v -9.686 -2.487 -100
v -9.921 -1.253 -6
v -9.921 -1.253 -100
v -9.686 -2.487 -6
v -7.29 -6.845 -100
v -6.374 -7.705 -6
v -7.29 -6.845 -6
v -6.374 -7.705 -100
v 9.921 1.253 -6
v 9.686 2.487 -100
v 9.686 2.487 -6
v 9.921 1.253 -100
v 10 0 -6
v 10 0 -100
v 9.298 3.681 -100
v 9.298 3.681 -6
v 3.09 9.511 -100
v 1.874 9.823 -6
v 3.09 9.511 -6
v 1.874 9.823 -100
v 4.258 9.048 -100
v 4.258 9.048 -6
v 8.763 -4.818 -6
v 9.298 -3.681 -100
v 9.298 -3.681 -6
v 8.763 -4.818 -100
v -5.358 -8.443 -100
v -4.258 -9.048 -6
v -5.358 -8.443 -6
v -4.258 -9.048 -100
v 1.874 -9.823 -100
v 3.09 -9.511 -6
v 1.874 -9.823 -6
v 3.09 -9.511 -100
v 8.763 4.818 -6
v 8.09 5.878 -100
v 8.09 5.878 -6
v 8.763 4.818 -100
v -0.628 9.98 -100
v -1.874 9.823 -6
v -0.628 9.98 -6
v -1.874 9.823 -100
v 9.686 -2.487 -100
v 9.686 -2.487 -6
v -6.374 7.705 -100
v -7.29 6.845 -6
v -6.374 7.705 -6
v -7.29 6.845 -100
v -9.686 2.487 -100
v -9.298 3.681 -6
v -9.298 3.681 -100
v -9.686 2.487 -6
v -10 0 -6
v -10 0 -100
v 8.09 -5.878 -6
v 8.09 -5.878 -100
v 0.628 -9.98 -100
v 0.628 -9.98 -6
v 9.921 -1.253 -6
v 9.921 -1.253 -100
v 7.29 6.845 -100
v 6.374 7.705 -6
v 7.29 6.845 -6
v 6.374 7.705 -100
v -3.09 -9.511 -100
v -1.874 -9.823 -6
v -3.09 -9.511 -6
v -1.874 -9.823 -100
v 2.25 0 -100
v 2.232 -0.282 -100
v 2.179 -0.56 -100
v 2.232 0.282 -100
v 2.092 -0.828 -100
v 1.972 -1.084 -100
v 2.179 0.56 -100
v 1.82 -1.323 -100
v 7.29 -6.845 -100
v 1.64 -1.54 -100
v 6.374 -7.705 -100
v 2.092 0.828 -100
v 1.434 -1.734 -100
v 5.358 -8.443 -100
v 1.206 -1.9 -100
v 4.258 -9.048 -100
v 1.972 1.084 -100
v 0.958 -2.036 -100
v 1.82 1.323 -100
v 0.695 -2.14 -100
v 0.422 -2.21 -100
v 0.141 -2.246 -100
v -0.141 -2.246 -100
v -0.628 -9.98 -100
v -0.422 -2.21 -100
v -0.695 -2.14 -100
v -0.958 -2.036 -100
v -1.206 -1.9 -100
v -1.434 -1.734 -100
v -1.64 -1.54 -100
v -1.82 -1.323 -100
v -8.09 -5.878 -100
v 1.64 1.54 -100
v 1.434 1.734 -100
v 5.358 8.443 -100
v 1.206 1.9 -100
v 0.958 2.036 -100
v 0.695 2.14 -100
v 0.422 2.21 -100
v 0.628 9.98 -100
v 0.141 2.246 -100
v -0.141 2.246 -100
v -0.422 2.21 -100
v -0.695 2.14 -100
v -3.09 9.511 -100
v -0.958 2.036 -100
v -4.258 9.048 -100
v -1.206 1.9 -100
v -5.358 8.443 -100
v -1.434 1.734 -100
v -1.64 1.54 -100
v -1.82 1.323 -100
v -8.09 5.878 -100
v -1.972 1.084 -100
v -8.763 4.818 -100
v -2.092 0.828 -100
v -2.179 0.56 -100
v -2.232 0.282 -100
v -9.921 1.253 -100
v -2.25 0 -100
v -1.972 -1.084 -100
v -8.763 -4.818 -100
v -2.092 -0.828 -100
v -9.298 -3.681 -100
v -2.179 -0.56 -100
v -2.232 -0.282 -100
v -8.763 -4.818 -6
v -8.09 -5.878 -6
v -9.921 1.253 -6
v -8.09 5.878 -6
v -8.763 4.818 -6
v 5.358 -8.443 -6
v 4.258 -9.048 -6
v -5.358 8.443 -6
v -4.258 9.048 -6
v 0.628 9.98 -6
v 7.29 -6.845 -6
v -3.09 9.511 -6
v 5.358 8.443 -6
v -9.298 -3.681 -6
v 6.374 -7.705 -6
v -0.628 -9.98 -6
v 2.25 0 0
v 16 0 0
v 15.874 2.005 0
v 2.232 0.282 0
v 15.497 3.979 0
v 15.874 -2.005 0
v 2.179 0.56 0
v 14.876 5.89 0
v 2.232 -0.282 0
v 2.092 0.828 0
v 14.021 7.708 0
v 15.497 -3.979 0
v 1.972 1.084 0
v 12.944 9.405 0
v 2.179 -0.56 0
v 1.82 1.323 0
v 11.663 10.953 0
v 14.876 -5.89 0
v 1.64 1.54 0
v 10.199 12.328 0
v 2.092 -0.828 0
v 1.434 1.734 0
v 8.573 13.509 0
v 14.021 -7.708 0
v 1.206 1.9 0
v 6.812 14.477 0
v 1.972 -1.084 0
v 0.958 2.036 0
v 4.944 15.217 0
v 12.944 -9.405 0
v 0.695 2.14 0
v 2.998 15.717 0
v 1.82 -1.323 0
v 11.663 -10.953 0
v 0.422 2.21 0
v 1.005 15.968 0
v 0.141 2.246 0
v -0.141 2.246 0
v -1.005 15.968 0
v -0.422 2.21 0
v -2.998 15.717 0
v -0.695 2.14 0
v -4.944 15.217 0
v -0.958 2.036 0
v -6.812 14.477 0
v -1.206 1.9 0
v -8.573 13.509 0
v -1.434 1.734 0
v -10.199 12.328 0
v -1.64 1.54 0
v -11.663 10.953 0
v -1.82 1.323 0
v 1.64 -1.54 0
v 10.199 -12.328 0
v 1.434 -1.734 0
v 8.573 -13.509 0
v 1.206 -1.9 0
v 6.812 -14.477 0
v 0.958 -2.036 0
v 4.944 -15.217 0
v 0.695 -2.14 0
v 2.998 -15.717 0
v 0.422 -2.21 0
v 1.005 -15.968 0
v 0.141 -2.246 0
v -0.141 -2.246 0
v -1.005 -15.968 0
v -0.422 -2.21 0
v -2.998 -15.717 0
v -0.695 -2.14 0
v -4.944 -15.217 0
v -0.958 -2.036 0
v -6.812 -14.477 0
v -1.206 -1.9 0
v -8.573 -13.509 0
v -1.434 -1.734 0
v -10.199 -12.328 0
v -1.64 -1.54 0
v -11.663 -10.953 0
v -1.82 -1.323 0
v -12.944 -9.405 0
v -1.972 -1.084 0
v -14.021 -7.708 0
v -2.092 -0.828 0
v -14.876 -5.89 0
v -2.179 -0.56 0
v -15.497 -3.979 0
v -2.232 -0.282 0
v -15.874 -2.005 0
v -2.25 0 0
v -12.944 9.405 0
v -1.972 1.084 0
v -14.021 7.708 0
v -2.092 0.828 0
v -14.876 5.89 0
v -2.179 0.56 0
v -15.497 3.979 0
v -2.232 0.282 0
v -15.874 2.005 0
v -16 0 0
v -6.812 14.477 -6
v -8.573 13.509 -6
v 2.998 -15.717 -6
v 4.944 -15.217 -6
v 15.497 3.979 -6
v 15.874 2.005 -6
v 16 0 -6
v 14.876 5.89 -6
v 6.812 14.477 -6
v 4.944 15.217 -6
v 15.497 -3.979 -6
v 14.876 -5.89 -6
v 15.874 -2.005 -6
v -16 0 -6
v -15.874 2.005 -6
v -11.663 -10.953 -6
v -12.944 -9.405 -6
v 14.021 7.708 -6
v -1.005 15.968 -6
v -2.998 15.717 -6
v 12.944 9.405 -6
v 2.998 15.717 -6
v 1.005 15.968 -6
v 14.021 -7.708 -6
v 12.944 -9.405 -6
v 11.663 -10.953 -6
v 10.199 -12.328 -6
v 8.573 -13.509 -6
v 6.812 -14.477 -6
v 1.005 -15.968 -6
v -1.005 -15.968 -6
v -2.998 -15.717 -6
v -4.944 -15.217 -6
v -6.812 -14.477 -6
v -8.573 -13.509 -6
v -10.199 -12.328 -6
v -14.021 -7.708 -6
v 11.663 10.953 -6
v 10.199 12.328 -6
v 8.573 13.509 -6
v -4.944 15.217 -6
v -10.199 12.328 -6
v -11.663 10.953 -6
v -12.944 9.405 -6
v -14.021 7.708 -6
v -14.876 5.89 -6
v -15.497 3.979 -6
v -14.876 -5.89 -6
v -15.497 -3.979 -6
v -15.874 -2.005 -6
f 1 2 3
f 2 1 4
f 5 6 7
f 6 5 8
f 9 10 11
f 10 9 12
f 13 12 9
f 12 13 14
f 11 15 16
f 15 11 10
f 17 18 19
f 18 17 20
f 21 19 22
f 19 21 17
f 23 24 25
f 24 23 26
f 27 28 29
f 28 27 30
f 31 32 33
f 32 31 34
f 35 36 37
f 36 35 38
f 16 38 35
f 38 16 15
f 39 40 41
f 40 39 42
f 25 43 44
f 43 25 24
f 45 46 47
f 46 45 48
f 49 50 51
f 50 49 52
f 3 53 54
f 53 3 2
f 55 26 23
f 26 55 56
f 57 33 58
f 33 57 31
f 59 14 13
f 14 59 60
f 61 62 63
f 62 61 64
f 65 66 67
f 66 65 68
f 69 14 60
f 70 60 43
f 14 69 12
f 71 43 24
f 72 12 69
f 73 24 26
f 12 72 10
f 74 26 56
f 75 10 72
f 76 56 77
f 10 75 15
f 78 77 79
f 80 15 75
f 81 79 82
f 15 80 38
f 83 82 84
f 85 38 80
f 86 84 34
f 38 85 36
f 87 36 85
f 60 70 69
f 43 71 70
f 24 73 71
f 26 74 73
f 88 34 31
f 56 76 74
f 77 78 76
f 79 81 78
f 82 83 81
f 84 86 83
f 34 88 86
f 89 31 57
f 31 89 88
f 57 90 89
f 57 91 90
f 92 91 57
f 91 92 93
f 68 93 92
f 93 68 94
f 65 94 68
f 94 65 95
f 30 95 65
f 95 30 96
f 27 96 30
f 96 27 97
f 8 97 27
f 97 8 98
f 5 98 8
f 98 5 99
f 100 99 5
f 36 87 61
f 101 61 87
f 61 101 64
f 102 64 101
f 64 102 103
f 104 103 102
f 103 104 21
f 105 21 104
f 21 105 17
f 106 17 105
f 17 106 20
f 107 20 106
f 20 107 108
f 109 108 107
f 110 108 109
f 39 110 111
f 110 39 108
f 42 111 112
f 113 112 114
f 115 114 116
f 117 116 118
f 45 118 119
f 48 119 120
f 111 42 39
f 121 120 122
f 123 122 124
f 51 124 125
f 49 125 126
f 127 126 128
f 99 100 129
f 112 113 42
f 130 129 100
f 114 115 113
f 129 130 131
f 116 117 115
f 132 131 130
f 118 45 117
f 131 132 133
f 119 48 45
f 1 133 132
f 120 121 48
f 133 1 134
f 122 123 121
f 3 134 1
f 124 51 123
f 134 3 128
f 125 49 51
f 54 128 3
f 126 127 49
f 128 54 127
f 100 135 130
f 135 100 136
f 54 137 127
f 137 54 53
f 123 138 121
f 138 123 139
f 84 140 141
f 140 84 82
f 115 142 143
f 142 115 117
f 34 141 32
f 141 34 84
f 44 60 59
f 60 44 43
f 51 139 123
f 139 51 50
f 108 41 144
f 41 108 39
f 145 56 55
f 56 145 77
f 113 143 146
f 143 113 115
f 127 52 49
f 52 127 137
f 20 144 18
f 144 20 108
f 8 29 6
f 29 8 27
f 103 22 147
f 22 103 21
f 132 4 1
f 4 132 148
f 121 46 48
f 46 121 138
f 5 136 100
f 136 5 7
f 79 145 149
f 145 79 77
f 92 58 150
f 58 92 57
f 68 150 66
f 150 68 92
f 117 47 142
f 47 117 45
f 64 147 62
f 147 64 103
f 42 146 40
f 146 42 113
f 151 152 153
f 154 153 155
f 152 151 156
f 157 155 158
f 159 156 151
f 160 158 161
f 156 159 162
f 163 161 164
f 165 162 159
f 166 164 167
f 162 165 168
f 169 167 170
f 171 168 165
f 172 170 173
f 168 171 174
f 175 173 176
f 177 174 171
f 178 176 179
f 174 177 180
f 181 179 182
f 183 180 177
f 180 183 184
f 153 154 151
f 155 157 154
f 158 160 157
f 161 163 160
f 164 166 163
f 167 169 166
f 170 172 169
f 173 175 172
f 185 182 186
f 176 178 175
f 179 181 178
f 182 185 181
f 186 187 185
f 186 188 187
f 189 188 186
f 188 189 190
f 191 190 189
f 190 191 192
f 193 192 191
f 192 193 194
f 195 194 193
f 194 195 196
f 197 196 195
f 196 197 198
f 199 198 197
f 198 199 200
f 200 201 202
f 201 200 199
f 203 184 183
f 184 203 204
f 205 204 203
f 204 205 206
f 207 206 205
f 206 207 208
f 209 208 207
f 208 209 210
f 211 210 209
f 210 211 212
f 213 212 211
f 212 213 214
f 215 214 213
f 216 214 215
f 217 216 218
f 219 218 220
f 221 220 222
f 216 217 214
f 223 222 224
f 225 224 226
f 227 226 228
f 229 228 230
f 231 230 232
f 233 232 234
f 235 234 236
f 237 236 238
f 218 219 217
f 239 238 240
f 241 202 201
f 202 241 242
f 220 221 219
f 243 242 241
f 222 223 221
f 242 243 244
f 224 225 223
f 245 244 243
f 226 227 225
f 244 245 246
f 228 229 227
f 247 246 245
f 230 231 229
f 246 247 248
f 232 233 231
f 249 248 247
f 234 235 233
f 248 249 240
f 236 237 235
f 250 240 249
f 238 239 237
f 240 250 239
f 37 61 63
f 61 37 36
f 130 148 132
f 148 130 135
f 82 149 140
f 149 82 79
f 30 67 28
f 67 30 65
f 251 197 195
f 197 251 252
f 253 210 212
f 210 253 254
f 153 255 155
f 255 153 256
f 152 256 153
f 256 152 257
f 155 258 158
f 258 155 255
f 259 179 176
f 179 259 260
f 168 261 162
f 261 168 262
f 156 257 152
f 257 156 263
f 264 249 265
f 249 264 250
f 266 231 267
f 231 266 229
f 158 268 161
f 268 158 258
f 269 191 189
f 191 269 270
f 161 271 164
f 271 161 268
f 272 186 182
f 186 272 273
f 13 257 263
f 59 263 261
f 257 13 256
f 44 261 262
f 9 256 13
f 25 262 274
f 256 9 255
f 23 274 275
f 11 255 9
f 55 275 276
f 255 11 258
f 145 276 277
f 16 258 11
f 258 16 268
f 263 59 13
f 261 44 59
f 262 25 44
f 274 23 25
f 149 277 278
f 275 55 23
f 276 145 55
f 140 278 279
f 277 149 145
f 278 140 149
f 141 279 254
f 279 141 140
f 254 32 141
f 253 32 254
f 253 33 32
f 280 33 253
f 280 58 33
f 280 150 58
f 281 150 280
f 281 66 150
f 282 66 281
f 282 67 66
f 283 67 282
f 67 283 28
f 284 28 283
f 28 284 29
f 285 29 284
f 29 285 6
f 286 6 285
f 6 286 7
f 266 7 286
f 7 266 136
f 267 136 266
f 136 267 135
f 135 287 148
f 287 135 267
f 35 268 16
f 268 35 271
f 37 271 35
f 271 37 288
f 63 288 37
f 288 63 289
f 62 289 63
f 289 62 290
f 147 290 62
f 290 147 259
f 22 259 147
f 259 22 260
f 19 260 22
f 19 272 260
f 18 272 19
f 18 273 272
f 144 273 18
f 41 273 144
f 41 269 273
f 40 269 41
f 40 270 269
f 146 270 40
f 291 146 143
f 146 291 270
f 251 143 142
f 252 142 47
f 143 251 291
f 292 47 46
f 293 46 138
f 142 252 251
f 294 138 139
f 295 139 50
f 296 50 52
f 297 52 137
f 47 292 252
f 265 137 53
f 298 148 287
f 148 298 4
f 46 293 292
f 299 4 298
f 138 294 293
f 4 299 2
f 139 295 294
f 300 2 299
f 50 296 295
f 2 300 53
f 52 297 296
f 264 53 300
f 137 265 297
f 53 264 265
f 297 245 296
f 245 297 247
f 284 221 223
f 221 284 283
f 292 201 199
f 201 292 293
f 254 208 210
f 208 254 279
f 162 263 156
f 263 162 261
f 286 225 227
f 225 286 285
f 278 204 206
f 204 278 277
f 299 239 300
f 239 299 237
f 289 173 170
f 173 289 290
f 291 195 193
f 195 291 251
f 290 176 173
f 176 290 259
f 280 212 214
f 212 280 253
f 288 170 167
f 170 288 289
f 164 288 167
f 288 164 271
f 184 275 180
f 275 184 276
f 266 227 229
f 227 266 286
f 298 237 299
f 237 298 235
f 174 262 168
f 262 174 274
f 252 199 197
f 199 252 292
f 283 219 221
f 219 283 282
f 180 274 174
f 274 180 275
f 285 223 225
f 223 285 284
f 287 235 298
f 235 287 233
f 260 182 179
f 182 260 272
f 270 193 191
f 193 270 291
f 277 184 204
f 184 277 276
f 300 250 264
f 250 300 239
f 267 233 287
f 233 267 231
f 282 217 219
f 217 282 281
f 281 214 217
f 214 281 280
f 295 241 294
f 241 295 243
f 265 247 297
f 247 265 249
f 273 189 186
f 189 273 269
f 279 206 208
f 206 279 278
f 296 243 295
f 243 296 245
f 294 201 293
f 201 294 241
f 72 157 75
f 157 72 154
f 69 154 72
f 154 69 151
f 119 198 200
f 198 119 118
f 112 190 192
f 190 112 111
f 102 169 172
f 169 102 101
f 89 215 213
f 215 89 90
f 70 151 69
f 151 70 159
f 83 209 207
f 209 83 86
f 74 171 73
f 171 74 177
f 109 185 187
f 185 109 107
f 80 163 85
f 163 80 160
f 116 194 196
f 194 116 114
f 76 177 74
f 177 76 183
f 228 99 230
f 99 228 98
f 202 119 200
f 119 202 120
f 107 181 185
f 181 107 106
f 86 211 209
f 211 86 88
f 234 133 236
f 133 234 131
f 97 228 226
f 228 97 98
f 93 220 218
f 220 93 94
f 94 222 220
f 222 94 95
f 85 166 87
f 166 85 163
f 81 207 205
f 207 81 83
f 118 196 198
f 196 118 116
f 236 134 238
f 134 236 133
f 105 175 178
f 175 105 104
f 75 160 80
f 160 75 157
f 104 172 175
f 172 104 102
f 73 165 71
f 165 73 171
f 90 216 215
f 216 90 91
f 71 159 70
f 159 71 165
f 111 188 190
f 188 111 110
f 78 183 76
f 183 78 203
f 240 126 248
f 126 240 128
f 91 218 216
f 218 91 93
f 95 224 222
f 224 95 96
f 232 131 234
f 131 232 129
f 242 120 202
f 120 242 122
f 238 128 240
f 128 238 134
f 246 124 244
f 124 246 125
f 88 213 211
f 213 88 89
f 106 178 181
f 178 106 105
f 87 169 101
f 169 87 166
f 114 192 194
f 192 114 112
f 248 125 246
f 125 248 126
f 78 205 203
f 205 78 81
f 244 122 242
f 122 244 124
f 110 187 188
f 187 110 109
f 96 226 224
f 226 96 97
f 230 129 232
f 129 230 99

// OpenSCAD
$fn = 50;


difference() {
	union() {
		translate(v = [0, 0, -100.0000000000]) {
			cylinder(h = 100, r = 10.0000000000);
		}
		translate(v = [0, 0, -6.0000000000]) {
			cylinder(h = 6, r = 16.0000000000);
		}
	}
	union() {
		#translate(v = [0, 0, -100]) {
			cylinder(h = 100, r = 2.2500000000);
		}
	}
}
